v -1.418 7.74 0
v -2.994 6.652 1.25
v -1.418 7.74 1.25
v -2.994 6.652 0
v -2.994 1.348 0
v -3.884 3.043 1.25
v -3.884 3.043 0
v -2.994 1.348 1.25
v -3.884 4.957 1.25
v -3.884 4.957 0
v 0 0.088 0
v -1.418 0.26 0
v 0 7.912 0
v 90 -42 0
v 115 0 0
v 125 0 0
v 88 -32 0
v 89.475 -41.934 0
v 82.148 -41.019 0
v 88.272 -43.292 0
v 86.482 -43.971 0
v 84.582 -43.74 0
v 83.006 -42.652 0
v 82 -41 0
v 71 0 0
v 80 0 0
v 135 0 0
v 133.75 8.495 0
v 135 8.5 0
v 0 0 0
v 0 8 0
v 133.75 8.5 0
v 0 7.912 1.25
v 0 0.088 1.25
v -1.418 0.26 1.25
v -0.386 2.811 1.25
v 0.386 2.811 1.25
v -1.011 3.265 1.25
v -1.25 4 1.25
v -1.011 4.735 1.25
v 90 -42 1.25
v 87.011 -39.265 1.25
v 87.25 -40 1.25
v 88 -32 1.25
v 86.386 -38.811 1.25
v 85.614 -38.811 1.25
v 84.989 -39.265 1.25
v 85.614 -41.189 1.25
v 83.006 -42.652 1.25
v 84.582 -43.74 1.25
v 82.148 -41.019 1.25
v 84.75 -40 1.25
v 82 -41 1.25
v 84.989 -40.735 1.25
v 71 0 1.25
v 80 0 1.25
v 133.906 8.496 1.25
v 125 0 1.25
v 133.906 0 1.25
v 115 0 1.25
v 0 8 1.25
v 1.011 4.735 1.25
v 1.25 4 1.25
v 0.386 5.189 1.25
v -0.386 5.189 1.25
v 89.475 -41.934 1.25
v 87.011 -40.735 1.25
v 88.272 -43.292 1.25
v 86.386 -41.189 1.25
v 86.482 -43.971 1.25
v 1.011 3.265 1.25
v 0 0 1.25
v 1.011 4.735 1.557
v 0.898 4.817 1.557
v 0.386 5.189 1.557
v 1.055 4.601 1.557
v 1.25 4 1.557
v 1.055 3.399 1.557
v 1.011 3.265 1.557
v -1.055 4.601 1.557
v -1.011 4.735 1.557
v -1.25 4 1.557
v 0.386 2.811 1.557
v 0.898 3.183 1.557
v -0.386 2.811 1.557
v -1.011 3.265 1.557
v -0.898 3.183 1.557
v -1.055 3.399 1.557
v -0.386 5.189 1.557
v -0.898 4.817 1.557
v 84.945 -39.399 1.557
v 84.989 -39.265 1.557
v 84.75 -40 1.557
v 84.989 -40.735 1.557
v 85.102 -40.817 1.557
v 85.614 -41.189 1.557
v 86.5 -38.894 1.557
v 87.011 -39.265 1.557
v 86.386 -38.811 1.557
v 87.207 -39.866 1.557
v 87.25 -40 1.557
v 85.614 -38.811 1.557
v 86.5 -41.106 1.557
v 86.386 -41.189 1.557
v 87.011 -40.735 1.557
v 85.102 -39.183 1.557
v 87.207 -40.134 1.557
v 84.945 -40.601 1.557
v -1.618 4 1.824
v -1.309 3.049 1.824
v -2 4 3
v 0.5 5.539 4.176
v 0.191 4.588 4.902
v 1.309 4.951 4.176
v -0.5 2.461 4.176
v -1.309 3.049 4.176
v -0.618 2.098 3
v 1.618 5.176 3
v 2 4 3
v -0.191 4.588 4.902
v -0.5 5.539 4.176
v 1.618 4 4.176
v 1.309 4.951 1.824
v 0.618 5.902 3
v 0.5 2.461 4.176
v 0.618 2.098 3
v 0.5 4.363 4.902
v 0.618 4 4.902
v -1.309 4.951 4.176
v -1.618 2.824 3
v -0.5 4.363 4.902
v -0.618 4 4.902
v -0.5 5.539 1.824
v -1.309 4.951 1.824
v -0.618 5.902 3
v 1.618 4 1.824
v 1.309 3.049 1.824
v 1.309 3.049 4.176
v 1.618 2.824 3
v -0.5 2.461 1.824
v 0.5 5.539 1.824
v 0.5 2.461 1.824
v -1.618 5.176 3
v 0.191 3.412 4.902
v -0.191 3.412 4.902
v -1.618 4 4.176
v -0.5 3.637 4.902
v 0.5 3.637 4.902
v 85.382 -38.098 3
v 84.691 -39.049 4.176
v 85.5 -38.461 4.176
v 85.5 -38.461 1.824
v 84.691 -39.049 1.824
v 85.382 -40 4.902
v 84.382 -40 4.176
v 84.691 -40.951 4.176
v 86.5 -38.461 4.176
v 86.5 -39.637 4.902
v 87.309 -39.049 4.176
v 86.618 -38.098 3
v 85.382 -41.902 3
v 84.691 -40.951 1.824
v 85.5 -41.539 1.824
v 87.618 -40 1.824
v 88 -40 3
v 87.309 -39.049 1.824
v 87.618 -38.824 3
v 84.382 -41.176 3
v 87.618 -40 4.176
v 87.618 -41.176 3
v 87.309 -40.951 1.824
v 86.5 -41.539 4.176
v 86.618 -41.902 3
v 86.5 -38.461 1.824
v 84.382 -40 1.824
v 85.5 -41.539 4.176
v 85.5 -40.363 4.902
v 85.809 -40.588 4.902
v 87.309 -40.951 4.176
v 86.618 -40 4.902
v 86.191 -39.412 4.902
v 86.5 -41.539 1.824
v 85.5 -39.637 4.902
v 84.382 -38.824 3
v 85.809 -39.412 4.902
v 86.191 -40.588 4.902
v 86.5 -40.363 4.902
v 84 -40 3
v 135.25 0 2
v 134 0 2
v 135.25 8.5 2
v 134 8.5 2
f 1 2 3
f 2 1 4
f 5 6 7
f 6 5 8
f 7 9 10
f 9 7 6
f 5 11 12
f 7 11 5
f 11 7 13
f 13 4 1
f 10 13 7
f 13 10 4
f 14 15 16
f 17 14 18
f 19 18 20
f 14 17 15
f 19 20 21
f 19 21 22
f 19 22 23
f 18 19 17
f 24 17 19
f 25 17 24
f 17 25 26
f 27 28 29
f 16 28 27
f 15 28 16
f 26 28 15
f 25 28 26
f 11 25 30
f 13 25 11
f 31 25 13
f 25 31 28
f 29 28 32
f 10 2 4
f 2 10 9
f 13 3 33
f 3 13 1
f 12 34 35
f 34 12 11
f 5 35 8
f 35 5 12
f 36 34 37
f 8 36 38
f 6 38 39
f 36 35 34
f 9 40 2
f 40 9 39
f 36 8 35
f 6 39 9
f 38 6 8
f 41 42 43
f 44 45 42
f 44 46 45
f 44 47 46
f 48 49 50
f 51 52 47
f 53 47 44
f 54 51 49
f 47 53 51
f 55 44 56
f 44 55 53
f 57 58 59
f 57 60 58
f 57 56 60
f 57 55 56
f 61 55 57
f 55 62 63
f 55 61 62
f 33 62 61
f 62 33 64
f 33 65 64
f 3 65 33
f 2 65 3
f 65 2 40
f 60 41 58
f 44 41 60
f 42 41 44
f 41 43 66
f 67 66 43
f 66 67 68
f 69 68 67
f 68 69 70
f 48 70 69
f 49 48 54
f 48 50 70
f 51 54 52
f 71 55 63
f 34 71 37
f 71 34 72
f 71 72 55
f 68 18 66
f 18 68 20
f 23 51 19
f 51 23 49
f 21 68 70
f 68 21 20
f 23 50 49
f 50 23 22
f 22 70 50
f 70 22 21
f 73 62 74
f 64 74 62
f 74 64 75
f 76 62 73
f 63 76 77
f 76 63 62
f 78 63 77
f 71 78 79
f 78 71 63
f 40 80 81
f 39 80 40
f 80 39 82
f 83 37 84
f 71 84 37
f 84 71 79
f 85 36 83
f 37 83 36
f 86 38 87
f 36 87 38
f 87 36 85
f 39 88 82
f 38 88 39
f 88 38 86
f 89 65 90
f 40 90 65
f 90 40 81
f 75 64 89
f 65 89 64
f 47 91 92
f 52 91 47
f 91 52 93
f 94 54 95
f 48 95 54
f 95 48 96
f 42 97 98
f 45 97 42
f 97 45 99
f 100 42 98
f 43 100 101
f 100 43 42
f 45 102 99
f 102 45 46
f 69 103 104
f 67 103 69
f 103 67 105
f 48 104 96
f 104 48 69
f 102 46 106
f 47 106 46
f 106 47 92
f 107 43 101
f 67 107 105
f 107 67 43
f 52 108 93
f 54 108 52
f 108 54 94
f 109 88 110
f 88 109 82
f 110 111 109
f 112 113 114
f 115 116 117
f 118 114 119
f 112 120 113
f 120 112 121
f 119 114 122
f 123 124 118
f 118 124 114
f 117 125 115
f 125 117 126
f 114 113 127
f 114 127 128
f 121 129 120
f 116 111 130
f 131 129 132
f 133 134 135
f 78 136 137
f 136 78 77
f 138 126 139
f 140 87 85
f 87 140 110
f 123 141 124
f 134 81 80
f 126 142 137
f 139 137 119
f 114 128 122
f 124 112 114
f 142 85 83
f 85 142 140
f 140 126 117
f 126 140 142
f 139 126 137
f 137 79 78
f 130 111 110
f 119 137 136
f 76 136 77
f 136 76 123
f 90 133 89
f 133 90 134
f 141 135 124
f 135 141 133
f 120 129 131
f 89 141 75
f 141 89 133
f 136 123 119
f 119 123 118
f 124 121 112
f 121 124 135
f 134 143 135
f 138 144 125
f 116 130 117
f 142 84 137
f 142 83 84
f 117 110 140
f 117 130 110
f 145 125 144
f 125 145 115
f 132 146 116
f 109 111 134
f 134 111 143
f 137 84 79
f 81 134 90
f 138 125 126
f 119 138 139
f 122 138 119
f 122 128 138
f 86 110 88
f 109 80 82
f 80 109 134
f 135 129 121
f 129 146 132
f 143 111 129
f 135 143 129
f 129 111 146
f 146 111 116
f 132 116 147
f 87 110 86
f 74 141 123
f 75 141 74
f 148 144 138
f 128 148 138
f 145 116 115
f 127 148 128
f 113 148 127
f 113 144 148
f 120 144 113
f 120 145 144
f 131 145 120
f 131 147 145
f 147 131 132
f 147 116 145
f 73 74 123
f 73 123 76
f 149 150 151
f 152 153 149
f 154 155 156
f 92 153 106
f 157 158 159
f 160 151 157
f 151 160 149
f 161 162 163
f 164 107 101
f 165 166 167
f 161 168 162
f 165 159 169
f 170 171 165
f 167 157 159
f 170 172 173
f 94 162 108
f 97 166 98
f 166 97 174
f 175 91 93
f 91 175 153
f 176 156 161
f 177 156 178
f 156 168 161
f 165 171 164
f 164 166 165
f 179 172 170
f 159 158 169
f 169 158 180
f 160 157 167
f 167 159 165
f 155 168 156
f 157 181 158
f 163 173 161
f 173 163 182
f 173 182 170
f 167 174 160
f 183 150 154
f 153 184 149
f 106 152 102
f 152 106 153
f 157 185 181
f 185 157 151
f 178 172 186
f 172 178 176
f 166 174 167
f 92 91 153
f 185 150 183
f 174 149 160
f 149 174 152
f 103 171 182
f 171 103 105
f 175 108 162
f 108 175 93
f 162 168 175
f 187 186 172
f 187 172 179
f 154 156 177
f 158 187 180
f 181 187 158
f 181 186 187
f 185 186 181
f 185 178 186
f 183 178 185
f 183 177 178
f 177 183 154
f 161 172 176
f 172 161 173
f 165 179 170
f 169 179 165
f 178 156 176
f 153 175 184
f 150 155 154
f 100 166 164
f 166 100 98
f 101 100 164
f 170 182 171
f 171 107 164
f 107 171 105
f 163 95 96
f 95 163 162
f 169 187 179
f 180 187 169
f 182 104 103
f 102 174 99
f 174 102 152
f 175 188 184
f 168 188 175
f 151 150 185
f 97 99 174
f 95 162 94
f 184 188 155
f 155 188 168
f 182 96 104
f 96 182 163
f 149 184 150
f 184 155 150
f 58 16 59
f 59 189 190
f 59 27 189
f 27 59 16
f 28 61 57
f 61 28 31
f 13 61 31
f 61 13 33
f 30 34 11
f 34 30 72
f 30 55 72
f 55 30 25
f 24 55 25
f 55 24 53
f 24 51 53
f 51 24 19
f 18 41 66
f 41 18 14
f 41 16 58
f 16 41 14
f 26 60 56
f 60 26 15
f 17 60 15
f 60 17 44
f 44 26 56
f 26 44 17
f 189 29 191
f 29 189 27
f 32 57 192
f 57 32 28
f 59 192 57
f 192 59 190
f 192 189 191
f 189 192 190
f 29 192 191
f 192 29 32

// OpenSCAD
translate([0,4,0]) cylinder(h=1.25,r=4);
translate([86,-40,0]) cylinder(h=1.25,r=4);
translate([0,4,0]) cylinder(h=3.5,r=1.25,$fn=10);
translate([86,-40,0]) cylinder(h=3.5,r=1.25,$fn=10);
translate([0,4,3]) sphere(h=3,r=2,$fn=10);
translate([86,-40,3]) sphere(h=3,r=2,$fn=10);
//cube([185,8,1]);
//translate([185,5,0]) rotate(-10) cube([70,3,1]);

strap_width = 8.5;

//end point
epx = 135;
epy = strap_width;

linear_extrude(height=1.25)
    polygon(points = [[0,0], [71,0],[82,-41],[90,-42],[125,0],[epx,0],[epx,epy],[0,8],[80,0],[88,-32],[115,0]], paths=[[0,1,2,3,4,5,6,7],[8,9,10]]);
    
translate([epx,0])
rotate([-90,0,0])
linear_extrude(height=strap_width)
    polygon(points = [[0,0],[-1.25,0],[-1,-2],[0.25,-2]]);
